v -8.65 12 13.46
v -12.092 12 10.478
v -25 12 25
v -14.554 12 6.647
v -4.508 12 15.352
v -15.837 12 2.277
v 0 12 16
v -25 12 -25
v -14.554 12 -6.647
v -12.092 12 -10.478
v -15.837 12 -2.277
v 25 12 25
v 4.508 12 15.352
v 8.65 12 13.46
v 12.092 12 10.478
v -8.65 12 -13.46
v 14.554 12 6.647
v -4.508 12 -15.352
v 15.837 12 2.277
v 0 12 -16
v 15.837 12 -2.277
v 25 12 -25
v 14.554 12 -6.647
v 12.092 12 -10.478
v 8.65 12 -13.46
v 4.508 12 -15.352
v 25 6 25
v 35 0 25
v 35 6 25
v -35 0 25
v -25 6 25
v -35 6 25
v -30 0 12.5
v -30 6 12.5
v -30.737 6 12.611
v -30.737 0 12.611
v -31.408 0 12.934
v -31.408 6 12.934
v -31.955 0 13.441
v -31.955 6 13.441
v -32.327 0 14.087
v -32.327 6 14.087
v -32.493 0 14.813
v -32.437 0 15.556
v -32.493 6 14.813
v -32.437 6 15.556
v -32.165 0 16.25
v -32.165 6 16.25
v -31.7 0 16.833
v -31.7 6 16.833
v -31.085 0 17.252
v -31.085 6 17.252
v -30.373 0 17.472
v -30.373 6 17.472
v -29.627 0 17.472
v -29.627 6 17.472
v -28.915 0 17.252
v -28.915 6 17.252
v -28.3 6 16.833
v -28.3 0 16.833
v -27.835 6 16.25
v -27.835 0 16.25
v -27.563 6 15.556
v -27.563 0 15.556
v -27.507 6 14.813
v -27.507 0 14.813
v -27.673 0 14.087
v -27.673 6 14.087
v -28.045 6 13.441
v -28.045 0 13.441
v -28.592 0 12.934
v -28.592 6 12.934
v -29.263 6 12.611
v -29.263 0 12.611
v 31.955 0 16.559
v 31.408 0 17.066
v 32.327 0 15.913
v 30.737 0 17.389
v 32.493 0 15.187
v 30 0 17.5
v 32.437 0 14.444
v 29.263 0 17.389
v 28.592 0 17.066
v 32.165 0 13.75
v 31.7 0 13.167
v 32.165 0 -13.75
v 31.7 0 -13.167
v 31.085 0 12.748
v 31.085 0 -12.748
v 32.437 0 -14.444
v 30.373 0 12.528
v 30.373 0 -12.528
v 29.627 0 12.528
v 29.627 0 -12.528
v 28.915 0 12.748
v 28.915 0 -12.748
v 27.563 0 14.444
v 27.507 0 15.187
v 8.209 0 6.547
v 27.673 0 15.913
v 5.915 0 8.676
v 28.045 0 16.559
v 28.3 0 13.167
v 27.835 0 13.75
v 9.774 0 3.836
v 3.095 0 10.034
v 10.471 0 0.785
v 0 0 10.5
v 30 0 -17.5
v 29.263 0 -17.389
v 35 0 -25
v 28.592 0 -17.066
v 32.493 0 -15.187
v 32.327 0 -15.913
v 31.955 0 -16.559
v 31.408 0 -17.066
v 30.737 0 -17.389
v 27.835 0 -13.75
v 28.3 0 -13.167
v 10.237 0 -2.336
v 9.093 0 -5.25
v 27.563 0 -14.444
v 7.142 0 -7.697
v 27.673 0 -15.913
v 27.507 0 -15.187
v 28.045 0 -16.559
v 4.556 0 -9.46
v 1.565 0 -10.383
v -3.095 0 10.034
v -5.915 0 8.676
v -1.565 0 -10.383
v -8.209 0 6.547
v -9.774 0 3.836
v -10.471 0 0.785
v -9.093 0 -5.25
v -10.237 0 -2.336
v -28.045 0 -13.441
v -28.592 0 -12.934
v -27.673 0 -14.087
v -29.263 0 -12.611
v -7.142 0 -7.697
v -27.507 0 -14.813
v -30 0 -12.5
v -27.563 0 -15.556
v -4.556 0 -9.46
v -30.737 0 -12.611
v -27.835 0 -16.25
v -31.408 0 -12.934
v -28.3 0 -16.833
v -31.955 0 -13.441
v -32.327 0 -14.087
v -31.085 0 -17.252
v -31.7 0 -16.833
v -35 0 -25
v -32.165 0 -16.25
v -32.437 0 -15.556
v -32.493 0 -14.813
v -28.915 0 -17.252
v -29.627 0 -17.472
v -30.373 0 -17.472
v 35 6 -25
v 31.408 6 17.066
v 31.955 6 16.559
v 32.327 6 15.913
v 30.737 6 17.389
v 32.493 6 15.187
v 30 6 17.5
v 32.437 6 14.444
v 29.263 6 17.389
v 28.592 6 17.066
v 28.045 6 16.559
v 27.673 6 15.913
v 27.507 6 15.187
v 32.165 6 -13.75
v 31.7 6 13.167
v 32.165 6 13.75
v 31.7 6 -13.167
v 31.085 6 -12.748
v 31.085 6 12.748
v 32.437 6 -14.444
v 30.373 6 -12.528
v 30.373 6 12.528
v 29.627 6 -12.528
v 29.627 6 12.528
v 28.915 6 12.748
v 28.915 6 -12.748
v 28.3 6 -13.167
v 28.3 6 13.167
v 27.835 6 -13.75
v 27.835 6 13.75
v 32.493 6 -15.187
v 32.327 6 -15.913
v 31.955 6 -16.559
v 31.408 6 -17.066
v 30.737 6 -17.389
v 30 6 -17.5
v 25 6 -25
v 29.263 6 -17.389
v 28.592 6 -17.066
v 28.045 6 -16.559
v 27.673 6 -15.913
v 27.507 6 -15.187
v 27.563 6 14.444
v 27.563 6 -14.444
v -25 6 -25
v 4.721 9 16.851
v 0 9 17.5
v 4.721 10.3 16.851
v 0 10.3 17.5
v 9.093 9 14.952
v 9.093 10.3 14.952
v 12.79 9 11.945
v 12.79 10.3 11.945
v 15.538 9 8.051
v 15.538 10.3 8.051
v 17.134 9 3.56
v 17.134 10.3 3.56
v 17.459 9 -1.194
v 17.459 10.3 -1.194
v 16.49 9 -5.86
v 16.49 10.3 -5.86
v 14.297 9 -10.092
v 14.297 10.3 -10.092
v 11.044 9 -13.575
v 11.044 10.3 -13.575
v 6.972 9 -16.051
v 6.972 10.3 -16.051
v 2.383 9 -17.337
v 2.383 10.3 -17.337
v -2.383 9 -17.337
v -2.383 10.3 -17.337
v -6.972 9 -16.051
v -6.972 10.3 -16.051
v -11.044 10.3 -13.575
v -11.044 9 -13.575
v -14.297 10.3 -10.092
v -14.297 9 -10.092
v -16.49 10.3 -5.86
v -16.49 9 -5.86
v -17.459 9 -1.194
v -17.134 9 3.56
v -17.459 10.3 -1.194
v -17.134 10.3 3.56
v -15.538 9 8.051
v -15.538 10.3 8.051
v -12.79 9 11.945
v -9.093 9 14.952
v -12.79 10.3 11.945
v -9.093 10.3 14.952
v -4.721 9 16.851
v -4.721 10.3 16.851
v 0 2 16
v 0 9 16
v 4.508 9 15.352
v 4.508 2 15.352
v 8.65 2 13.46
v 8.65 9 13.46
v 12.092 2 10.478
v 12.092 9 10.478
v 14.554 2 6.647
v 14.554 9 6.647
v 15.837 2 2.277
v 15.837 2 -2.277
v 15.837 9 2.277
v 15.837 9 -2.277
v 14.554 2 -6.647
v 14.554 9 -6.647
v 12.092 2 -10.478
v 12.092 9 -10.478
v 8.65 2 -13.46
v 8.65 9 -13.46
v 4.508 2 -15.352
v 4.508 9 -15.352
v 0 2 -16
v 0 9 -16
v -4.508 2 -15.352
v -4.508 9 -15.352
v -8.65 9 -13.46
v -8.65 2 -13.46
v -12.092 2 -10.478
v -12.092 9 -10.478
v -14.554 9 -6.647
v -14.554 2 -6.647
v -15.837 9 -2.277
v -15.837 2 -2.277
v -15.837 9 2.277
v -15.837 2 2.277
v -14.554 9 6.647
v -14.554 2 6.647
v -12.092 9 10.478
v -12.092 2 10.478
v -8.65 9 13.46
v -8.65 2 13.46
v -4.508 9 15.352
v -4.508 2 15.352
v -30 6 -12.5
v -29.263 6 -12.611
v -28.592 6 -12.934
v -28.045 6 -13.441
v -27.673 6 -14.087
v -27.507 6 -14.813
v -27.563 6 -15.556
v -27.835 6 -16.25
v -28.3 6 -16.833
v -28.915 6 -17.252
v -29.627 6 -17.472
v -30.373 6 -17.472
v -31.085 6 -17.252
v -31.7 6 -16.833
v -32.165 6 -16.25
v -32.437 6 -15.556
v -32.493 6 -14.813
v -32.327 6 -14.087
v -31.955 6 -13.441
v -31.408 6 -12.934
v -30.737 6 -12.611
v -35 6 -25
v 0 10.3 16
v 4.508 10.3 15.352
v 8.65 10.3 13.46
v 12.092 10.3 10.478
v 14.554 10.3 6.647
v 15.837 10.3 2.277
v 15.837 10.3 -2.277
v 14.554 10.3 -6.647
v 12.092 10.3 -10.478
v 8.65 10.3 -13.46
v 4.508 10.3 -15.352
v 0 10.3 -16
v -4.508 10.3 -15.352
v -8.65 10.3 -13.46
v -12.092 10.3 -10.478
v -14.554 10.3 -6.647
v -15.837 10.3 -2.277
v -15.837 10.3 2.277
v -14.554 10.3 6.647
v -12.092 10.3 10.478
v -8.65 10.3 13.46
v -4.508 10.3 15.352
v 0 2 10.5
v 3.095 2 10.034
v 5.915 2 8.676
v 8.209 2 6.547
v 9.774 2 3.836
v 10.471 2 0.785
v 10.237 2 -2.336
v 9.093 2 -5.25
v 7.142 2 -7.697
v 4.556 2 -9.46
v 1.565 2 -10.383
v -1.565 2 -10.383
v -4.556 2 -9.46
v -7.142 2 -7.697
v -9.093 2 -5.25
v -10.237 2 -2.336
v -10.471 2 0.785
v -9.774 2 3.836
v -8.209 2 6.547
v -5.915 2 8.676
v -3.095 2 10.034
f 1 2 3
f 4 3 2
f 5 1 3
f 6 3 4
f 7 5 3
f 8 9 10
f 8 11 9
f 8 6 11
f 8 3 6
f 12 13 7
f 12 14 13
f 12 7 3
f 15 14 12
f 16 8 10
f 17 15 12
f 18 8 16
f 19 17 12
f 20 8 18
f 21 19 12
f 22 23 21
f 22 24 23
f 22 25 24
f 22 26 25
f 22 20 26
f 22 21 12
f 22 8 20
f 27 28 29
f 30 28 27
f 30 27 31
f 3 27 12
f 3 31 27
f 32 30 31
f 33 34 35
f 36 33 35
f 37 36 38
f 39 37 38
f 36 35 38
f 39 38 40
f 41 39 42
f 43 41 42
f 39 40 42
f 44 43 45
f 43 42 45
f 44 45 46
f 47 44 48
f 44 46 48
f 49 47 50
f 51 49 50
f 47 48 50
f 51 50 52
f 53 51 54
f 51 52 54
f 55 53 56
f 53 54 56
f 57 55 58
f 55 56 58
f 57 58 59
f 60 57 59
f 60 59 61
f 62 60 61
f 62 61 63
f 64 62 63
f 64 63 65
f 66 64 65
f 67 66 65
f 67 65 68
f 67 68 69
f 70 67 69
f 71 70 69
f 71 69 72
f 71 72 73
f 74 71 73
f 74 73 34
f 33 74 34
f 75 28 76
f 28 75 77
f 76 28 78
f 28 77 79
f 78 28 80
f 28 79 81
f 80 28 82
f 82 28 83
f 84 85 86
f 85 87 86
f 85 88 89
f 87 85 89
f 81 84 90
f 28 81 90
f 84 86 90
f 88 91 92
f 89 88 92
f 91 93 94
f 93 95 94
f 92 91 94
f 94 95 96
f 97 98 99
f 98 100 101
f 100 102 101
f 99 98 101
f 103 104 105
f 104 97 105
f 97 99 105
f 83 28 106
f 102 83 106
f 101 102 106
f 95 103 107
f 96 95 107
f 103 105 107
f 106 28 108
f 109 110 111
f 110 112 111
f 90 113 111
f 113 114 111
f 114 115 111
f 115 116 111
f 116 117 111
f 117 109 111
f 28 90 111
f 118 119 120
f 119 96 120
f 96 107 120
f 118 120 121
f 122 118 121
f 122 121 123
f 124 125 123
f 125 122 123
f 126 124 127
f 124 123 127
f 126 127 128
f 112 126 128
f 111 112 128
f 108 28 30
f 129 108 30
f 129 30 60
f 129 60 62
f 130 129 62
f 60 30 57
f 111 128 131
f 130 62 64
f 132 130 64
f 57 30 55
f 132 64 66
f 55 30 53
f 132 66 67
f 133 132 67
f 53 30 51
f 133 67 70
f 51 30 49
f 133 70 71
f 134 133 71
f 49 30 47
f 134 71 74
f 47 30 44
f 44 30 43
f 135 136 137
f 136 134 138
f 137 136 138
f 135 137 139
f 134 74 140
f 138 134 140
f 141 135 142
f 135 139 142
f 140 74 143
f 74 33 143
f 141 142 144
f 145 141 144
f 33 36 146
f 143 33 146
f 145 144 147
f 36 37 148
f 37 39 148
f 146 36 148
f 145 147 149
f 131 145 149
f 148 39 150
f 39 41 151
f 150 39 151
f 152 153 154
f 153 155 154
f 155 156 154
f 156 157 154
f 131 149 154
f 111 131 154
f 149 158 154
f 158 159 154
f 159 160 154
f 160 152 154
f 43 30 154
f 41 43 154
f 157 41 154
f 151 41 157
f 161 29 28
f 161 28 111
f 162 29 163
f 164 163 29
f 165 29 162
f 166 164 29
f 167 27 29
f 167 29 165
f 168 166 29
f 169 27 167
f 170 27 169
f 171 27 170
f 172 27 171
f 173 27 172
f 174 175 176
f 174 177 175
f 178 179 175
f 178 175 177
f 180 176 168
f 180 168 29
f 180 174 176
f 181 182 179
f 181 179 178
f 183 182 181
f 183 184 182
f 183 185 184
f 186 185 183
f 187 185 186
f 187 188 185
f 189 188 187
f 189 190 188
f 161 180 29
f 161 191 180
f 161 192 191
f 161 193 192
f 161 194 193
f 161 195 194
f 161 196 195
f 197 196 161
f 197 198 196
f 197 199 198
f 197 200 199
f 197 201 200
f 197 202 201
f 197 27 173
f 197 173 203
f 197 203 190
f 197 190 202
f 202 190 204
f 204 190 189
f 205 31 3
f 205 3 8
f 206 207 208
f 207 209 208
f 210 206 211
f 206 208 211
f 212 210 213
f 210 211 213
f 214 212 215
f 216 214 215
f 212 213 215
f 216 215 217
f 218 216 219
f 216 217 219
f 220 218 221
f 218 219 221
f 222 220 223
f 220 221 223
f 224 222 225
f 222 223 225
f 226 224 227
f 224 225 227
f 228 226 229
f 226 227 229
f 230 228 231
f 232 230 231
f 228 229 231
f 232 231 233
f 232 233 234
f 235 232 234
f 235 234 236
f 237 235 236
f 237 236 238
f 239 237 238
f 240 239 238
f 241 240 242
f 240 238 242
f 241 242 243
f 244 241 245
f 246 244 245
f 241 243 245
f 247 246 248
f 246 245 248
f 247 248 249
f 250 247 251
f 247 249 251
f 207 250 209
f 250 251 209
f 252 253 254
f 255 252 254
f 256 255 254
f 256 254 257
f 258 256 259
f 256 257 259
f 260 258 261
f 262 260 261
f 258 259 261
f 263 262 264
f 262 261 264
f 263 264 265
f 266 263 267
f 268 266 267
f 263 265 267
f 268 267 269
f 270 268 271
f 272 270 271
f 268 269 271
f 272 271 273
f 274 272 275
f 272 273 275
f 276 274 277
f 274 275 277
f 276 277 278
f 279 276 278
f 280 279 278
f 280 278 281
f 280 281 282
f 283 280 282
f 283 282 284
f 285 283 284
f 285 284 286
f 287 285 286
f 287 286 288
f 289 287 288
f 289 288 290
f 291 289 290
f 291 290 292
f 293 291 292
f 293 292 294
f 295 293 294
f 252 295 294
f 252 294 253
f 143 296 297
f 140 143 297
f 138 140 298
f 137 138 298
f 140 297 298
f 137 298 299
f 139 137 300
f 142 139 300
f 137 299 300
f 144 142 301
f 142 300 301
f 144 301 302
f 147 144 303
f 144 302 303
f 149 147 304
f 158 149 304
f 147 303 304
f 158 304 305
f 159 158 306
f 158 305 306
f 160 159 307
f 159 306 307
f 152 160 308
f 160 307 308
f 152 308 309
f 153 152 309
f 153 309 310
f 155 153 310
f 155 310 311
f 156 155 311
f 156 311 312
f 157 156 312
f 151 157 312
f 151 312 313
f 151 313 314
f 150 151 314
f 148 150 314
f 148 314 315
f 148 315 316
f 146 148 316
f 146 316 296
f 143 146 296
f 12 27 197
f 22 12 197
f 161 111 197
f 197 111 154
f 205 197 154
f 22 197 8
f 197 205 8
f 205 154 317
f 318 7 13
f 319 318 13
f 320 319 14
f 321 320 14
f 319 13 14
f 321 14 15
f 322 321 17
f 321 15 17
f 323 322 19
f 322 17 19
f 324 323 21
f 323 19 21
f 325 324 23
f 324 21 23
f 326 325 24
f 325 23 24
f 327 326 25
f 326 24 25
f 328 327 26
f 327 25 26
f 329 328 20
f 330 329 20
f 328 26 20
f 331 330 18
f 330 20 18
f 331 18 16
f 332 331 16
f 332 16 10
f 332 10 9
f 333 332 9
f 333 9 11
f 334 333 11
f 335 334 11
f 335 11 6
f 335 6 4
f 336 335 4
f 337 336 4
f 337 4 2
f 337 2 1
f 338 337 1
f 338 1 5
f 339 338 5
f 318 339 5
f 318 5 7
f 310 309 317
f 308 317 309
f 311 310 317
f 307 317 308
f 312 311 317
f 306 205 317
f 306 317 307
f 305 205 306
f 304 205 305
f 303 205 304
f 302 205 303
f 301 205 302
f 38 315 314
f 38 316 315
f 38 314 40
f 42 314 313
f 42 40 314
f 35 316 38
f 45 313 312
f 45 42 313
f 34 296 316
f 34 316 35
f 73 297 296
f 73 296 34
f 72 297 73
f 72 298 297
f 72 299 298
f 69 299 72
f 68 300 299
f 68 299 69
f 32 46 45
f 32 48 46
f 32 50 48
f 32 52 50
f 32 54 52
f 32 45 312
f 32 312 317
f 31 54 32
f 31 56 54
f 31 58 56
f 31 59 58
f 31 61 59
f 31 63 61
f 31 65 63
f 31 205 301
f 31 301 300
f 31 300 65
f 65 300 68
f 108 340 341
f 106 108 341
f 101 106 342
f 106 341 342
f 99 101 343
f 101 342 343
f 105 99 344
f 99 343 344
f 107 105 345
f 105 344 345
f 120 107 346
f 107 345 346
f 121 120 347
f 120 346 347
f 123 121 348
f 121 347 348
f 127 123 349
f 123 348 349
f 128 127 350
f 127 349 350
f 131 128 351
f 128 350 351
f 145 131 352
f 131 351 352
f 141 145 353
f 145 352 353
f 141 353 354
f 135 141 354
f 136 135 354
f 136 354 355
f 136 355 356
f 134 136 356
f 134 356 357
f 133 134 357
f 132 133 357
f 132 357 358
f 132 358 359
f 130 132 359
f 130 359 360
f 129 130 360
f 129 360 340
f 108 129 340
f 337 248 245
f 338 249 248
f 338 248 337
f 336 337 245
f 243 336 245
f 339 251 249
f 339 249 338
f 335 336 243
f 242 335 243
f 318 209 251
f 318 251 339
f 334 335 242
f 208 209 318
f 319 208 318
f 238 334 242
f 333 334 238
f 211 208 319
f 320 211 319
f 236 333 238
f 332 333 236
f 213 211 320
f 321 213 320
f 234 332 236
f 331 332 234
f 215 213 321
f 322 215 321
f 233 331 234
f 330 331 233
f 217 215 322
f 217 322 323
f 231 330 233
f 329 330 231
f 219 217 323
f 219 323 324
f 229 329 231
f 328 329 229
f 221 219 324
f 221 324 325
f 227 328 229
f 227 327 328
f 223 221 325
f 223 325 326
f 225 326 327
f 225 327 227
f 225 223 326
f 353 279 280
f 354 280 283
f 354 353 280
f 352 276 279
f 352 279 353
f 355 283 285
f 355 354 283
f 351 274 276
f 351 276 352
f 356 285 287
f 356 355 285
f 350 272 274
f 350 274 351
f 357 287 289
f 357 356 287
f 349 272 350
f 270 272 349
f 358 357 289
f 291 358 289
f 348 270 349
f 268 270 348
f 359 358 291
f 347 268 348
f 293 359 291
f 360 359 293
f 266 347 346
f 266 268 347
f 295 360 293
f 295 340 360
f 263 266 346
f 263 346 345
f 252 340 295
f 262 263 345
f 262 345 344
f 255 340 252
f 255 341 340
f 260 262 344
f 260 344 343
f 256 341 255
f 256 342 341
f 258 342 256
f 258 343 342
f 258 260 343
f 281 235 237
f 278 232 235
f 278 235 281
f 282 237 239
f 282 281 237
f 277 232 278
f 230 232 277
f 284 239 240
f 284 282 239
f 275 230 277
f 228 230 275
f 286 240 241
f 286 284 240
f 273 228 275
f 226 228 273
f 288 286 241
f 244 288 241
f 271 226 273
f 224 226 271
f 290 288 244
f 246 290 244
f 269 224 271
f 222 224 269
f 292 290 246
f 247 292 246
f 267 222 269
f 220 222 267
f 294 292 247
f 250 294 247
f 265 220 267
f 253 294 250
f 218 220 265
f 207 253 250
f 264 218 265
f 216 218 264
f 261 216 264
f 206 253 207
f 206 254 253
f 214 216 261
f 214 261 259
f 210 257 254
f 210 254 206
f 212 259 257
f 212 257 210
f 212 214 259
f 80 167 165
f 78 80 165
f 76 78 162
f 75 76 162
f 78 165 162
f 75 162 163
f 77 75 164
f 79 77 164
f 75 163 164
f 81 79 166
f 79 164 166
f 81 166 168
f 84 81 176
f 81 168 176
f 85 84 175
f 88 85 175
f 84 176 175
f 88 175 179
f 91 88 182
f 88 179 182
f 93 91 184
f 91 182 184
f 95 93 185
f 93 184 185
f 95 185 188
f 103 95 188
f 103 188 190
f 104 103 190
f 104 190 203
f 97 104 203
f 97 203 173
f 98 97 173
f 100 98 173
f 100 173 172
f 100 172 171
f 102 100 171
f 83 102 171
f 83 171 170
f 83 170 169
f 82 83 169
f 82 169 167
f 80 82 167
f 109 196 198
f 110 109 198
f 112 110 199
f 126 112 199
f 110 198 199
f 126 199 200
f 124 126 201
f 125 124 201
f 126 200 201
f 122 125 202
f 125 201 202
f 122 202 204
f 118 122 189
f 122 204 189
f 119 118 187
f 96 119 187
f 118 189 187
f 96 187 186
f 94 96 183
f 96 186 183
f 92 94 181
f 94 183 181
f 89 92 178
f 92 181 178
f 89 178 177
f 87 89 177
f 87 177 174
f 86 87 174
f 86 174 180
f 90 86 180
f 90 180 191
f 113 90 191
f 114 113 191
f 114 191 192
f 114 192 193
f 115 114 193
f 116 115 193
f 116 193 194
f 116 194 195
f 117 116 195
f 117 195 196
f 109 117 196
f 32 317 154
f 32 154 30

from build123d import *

# Parameters (mm, degrees)
SKETCH1_W           = 50
SKETCH1_H           = 50
BOSS_EXTRUDE2_DEPTH = 12
SKETCH3_R           = 16
CUT_EXTRUDE1_DEPTH  = 10
SKETCH6_R           = 10.5
CUT_EXTRUDE2_DEPTH  = 10
SKETCH9_W           = 50
SKETCH9_H           = 6
BOSS_EXTRUDE3_DEPTH = 10
SKETCH11_W          = 50
SKETCH11_H          = 6
BOSS_EXTRUDE4_DEPTH = 10
SKETCH12_R          = 2.5
CUT_EXTRUDE4_DEPTH  = 10


with BuildPart() as part:
    # Sketch1 → Boss-Extrude2 (new body)
    with BuildSketch(Plane(origin=(0, 0, 0), x_dir=(1, 0, 0), z_dir=(0, 1, 0))):
        Rectangle(SKETCH1_W, SKETCH1_H)
    extrude(amount=BOSS_EXTRUDE2_DEPTH)

    # Sketch3 → Cut-Extrude1 (cut)
    with BuildSketch(Plane(origin=(0, 12, 0), x_dir=(1, 0, 0), z_dir=(0, 1, 0))):
        with Locations(Location((0, 0, 0), (0, 0, 270))):
            Circle(SKETCH3_R)
    extrude(amount=-CUT_EXTRUDE1_DEPTH, mode=Mode.SUBTRACT)

    # Sketch5 → Cut-Revolve1 (revolve, cut)
    with BuildSketch(Plane.XY, mode=Mode.PRIVATE) as cut_revolve1_sk:
        Polygon((-16, 9), (-17.5, 9), (-17.5, 10.3), (-16, 10.3), (-15.747172999, 10.3), (-15.747172999, 9), align=None)
    revolve(cut_revolve1_sk.sketch.rotate(Axis((0, 2, 0), (0, 1, 0)), 90), axis=Axis((0, 2, 0), (0, 1, 0)), mode=Mode.SUBTRACT)

    # Sketch6 → Cut-Extrude2 (cut)
    with BuildSketch(Plane(origin=(0, 2, 0), x_dir=(1, 0, 0), z_dir=(0, 1, 0))):
        with Locations(Location((0, 0, 0), (0, 0, 270))):
            Circle(SKETCH6_R)
    extrude(amount=-CUT_EXTRUDE2_DEPTH, mode=Mode.SUBTRACT)

    # Sketch9 → Boss-Extrude3 (add)
    with BuildSketch(Plane.ZY.offset(25)):
        with Locations((0, 3)):
            Rectangle(SKETCH9_W, SKETCH9_H)
    extrude(amount=BOSS_EXTRUDE3_DEPTH)

    # Sketch11 → Boss-Extrude4 (add)
    with BuildSketch(Plane(origin=(25, 0, 0), x_dir=(0, 0, -1), z_dir=(1, 0, 0))):
        with Locations((0, 3)):
            Rectangle(SKETCH11_W, SKETCH11_H)
    extrude(amount=BOSS_EXTRUDE4_DEPTH)

    # Sketch12 → Cut-Extrude4 (cut)
    with BuildSketch(Plane(origin=(0, 6, 0), x_dir=(1, 0, 0), z_dir=(0, 1, 0))):
        with Locations(Location((-30, 15, 0), (0, 0, 270))):
            Circle(SKETCH12_R)
        with Locations(Location((-30, -15, 0), (0, 0, 90))):
            Circle(SKETCH12_R)
        with Locations(Location((30, -15, 0), (0, 0, 270))):
            Circle(SKETCH12_R)
        with Locations(Location((30, 15, 0), (0, 0, 90))):
            Circle(SKETCH12_R)
    extrude(amount=-CUT_EXTRUDE4_DEPTH, mode=Mode.SUBTRACT)


solid = part.part
